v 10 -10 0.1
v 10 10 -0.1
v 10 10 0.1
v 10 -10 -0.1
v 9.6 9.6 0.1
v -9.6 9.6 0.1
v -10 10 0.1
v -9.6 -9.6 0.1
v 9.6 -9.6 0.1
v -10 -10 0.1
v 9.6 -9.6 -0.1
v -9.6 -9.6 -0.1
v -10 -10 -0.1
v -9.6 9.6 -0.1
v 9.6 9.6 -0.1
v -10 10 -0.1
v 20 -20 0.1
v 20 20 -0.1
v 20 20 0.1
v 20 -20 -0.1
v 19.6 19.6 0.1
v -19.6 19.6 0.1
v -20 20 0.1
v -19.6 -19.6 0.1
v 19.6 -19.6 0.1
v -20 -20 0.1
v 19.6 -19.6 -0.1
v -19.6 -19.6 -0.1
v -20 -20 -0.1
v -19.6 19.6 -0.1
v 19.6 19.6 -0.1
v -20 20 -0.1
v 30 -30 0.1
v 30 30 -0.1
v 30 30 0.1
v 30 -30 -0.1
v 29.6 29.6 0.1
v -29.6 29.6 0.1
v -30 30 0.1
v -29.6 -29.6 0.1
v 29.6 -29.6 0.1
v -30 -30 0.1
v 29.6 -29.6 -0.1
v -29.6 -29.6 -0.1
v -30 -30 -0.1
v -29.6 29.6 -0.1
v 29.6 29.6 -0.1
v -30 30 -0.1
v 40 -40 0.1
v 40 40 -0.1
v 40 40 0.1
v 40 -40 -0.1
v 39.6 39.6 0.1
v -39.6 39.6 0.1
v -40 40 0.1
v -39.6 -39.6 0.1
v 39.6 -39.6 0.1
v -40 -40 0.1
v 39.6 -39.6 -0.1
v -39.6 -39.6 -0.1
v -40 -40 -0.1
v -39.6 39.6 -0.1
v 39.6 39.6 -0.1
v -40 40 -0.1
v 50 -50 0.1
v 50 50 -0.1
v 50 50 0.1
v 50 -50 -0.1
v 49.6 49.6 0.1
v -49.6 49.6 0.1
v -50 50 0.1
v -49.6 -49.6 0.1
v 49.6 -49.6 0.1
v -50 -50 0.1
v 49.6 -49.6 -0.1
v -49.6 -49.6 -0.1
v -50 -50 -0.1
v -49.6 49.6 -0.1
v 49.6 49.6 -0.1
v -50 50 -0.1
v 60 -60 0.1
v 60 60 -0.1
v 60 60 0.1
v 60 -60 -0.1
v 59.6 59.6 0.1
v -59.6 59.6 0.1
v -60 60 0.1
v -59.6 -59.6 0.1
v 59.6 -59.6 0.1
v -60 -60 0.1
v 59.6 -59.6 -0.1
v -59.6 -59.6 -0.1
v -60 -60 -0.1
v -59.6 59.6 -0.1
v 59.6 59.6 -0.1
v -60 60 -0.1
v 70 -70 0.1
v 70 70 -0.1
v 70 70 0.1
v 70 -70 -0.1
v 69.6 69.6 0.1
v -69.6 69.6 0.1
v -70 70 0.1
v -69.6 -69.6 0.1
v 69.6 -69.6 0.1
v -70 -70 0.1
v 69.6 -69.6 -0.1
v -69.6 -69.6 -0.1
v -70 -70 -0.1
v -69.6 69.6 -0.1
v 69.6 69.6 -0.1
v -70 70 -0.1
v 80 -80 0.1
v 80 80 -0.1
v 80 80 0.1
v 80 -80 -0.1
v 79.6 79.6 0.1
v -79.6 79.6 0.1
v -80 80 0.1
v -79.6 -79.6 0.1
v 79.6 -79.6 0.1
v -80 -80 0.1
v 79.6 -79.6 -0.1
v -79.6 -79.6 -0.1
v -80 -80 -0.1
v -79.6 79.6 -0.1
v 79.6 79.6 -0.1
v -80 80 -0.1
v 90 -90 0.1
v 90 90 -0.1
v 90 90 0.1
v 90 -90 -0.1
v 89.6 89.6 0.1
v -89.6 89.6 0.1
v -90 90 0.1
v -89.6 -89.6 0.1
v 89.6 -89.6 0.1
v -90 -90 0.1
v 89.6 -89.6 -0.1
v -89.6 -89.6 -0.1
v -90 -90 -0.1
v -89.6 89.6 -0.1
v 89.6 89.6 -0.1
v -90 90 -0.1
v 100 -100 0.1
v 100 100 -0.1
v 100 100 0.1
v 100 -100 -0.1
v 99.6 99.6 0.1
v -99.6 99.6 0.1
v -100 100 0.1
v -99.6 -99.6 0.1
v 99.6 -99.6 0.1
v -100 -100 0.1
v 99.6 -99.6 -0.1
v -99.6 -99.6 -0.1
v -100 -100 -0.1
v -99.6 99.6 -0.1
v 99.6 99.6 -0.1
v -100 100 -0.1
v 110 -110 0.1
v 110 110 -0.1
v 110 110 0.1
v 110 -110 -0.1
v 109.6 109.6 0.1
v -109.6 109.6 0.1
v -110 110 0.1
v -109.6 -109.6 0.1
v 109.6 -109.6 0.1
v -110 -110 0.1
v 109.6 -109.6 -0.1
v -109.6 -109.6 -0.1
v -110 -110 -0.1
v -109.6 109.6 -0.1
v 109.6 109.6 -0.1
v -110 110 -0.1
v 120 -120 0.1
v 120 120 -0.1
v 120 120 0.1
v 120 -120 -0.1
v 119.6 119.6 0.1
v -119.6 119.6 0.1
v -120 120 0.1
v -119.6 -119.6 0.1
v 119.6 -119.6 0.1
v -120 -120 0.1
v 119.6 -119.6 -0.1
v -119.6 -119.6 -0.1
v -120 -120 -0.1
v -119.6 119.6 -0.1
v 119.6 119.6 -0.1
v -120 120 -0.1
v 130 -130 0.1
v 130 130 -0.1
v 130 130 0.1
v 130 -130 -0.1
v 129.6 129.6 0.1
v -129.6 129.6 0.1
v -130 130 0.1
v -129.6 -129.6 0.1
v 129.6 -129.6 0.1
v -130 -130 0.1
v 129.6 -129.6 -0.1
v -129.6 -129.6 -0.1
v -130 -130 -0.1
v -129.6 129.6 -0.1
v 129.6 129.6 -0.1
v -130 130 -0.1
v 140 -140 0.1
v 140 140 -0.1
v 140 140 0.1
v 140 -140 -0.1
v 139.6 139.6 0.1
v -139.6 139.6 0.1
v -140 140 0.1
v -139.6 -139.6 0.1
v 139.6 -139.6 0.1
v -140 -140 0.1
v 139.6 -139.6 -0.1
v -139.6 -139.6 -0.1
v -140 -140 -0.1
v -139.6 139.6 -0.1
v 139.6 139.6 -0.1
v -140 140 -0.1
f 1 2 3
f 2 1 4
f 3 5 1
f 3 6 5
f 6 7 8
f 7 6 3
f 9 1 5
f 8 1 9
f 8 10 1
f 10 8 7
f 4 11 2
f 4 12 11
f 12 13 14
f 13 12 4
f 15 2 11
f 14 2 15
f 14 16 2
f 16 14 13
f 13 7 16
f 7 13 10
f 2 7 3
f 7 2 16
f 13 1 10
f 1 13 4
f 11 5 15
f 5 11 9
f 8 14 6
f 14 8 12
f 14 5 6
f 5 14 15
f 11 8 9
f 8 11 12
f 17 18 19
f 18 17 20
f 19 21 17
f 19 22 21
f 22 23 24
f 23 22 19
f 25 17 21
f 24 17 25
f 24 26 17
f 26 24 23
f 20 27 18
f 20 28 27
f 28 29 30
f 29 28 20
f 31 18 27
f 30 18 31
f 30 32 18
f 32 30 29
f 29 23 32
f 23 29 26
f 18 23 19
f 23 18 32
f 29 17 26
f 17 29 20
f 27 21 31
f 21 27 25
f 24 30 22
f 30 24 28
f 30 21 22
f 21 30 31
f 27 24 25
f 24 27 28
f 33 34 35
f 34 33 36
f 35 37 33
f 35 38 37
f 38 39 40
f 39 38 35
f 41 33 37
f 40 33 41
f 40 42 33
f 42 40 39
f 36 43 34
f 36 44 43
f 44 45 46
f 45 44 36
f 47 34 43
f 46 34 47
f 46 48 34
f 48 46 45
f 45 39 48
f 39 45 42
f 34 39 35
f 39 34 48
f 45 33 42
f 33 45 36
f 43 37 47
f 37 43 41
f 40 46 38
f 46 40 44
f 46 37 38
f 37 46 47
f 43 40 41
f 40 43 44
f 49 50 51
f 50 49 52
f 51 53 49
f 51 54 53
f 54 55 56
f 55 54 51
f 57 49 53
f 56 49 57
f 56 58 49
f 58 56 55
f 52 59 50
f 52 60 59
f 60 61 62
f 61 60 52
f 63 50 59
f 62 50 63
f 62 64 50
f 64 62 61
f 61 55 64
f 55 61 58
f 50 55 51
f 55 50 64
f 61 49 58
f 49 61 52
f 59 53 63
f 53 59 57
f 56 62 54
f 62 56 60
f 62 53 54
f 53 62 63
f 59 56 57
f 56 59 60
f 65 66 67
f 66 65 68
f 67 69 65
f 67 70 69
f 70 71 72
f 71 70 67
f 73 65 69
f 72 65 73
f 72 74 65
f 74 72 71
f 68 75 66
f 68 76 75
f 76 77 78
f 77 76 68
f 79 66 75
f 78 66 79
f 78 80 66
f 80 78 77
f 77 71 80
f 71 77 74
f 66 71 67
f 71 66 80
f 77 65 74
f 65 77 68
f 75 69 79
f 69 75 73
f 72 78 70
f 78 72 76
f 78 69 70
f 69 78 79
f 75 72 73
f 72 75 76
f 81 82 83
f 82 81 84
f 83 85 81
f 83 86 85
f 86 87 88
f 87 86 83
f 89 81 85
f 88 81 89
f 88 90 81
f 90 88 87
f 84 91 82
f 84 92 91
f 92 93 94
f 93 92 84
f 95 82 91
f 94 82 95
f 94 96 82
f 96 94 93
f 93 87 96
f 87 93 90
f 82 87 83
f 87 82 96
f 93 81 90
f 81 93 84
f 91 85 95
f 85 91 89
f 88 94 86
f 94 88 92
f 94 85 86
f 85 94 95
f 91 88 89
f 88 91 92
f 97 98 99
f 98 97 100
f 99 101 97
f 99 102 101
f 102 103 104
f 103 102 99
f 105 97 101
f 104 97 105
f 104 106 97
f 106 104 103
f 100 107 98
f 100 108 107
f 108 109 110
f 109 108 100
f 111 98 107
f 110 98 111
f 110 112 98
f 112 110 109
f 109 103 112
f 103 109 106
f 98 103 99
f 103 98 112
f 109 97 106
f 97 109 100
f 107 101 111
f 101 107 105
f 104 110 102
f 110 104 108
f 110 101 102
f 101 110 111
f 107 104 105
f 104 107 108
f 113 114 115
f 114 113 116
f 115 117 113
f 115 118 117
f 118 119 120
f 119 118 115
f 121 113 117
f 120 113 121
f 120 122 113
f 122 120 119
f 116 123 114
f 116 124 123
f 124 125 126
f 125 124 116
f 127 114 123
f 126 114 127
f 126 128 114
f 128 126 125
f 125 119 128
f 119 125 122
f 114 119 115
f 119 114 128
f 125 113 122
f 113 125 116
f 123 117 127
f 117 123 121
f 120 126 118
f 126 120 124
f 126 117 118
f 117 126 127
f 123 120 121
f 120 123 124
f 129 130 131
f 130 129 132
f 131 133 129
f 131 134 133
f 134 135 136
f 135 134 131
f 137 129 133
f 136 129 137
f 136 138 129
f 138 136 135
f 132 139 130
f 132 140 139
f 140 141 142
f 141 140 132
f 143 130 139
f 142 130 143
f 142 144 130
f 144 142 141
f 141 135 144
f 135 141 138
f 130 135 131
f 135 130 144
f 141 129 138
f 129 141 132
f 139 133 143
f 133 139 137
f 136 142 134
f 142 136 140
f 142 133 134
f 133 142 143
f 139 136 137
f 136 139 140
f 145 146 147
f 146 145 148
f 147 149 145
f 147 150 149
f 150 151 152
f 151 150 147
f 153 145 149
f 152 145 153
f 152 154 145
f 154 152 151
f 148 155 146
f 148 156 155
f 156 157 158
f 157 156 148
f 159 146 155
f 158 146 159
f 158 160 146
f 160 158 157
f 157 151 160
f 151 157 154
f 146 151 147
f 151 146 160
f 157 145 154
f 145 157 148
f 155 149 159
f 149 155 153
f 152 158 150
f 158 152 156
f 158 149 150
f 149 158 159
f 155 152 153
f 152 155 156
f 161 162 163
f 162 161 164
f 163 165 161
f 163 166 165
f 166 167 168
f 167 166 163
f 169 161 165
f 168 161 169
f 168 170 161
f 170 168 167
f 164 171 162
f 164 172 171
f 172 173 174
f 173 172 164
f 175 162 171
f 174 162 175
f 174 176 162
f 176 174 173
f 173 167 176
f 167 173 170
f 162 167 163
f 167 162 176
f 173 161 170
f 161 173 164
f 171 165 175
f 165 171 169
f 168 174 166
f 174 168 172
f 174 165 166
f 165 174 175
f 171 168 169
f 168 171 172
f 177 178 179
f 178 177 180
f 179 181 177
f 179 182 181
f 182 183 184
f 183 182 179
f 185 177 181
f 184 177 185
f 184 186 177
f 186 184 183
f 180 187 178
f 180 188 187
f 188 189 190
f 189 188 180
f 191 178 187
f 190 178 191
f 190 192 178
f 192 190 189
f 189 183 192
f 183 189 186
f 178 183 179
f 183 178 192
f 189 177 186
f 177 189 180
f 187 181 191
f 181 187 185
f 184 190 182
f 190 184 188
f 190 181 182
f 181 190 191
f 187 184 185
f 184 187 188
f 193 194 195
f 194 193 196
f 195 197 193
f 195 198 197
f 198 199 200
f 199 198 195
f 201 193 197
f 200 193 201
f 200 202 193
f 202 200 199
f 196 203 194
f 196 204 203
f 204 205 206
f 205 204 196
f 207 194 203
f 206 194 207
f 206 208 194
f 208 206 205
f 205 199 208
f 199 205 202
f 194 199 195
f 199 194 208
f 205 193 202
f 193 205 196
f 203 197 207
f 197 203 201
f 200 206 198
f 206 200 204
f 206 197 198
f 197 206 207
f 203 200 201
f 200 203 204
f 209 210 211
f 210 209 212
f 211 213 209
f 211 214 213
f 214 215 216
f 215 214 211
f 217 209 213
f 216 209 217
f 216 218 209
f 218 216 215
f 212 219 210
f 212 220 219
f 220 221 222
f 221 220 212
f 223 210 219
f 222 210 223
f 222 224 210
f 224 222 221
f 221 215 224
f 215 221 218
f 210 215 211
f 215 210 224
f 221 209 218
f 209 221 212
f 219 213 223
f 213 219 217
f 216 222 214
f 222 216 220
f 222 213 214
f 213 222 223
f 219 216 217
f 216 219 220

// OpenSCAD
bedWidth = 300;
bedDepth = 300;
maxSpace = 10;
squareSpacing = 20;
lineWidth = .4;

// Calculations
squares = floor((bedWidth - maxSpace)/squareSpacing);
cubeDifference = lineWidth*2;

for (y=[1:squares]){
	difference(){
		cube([y*squareSpacing,y*squareSpacing,.2], center=true);
		cube([y*squareSpacing-cubeDifference,y*squareSpacing-cubeDifference,.2], center=true);
	}
}
